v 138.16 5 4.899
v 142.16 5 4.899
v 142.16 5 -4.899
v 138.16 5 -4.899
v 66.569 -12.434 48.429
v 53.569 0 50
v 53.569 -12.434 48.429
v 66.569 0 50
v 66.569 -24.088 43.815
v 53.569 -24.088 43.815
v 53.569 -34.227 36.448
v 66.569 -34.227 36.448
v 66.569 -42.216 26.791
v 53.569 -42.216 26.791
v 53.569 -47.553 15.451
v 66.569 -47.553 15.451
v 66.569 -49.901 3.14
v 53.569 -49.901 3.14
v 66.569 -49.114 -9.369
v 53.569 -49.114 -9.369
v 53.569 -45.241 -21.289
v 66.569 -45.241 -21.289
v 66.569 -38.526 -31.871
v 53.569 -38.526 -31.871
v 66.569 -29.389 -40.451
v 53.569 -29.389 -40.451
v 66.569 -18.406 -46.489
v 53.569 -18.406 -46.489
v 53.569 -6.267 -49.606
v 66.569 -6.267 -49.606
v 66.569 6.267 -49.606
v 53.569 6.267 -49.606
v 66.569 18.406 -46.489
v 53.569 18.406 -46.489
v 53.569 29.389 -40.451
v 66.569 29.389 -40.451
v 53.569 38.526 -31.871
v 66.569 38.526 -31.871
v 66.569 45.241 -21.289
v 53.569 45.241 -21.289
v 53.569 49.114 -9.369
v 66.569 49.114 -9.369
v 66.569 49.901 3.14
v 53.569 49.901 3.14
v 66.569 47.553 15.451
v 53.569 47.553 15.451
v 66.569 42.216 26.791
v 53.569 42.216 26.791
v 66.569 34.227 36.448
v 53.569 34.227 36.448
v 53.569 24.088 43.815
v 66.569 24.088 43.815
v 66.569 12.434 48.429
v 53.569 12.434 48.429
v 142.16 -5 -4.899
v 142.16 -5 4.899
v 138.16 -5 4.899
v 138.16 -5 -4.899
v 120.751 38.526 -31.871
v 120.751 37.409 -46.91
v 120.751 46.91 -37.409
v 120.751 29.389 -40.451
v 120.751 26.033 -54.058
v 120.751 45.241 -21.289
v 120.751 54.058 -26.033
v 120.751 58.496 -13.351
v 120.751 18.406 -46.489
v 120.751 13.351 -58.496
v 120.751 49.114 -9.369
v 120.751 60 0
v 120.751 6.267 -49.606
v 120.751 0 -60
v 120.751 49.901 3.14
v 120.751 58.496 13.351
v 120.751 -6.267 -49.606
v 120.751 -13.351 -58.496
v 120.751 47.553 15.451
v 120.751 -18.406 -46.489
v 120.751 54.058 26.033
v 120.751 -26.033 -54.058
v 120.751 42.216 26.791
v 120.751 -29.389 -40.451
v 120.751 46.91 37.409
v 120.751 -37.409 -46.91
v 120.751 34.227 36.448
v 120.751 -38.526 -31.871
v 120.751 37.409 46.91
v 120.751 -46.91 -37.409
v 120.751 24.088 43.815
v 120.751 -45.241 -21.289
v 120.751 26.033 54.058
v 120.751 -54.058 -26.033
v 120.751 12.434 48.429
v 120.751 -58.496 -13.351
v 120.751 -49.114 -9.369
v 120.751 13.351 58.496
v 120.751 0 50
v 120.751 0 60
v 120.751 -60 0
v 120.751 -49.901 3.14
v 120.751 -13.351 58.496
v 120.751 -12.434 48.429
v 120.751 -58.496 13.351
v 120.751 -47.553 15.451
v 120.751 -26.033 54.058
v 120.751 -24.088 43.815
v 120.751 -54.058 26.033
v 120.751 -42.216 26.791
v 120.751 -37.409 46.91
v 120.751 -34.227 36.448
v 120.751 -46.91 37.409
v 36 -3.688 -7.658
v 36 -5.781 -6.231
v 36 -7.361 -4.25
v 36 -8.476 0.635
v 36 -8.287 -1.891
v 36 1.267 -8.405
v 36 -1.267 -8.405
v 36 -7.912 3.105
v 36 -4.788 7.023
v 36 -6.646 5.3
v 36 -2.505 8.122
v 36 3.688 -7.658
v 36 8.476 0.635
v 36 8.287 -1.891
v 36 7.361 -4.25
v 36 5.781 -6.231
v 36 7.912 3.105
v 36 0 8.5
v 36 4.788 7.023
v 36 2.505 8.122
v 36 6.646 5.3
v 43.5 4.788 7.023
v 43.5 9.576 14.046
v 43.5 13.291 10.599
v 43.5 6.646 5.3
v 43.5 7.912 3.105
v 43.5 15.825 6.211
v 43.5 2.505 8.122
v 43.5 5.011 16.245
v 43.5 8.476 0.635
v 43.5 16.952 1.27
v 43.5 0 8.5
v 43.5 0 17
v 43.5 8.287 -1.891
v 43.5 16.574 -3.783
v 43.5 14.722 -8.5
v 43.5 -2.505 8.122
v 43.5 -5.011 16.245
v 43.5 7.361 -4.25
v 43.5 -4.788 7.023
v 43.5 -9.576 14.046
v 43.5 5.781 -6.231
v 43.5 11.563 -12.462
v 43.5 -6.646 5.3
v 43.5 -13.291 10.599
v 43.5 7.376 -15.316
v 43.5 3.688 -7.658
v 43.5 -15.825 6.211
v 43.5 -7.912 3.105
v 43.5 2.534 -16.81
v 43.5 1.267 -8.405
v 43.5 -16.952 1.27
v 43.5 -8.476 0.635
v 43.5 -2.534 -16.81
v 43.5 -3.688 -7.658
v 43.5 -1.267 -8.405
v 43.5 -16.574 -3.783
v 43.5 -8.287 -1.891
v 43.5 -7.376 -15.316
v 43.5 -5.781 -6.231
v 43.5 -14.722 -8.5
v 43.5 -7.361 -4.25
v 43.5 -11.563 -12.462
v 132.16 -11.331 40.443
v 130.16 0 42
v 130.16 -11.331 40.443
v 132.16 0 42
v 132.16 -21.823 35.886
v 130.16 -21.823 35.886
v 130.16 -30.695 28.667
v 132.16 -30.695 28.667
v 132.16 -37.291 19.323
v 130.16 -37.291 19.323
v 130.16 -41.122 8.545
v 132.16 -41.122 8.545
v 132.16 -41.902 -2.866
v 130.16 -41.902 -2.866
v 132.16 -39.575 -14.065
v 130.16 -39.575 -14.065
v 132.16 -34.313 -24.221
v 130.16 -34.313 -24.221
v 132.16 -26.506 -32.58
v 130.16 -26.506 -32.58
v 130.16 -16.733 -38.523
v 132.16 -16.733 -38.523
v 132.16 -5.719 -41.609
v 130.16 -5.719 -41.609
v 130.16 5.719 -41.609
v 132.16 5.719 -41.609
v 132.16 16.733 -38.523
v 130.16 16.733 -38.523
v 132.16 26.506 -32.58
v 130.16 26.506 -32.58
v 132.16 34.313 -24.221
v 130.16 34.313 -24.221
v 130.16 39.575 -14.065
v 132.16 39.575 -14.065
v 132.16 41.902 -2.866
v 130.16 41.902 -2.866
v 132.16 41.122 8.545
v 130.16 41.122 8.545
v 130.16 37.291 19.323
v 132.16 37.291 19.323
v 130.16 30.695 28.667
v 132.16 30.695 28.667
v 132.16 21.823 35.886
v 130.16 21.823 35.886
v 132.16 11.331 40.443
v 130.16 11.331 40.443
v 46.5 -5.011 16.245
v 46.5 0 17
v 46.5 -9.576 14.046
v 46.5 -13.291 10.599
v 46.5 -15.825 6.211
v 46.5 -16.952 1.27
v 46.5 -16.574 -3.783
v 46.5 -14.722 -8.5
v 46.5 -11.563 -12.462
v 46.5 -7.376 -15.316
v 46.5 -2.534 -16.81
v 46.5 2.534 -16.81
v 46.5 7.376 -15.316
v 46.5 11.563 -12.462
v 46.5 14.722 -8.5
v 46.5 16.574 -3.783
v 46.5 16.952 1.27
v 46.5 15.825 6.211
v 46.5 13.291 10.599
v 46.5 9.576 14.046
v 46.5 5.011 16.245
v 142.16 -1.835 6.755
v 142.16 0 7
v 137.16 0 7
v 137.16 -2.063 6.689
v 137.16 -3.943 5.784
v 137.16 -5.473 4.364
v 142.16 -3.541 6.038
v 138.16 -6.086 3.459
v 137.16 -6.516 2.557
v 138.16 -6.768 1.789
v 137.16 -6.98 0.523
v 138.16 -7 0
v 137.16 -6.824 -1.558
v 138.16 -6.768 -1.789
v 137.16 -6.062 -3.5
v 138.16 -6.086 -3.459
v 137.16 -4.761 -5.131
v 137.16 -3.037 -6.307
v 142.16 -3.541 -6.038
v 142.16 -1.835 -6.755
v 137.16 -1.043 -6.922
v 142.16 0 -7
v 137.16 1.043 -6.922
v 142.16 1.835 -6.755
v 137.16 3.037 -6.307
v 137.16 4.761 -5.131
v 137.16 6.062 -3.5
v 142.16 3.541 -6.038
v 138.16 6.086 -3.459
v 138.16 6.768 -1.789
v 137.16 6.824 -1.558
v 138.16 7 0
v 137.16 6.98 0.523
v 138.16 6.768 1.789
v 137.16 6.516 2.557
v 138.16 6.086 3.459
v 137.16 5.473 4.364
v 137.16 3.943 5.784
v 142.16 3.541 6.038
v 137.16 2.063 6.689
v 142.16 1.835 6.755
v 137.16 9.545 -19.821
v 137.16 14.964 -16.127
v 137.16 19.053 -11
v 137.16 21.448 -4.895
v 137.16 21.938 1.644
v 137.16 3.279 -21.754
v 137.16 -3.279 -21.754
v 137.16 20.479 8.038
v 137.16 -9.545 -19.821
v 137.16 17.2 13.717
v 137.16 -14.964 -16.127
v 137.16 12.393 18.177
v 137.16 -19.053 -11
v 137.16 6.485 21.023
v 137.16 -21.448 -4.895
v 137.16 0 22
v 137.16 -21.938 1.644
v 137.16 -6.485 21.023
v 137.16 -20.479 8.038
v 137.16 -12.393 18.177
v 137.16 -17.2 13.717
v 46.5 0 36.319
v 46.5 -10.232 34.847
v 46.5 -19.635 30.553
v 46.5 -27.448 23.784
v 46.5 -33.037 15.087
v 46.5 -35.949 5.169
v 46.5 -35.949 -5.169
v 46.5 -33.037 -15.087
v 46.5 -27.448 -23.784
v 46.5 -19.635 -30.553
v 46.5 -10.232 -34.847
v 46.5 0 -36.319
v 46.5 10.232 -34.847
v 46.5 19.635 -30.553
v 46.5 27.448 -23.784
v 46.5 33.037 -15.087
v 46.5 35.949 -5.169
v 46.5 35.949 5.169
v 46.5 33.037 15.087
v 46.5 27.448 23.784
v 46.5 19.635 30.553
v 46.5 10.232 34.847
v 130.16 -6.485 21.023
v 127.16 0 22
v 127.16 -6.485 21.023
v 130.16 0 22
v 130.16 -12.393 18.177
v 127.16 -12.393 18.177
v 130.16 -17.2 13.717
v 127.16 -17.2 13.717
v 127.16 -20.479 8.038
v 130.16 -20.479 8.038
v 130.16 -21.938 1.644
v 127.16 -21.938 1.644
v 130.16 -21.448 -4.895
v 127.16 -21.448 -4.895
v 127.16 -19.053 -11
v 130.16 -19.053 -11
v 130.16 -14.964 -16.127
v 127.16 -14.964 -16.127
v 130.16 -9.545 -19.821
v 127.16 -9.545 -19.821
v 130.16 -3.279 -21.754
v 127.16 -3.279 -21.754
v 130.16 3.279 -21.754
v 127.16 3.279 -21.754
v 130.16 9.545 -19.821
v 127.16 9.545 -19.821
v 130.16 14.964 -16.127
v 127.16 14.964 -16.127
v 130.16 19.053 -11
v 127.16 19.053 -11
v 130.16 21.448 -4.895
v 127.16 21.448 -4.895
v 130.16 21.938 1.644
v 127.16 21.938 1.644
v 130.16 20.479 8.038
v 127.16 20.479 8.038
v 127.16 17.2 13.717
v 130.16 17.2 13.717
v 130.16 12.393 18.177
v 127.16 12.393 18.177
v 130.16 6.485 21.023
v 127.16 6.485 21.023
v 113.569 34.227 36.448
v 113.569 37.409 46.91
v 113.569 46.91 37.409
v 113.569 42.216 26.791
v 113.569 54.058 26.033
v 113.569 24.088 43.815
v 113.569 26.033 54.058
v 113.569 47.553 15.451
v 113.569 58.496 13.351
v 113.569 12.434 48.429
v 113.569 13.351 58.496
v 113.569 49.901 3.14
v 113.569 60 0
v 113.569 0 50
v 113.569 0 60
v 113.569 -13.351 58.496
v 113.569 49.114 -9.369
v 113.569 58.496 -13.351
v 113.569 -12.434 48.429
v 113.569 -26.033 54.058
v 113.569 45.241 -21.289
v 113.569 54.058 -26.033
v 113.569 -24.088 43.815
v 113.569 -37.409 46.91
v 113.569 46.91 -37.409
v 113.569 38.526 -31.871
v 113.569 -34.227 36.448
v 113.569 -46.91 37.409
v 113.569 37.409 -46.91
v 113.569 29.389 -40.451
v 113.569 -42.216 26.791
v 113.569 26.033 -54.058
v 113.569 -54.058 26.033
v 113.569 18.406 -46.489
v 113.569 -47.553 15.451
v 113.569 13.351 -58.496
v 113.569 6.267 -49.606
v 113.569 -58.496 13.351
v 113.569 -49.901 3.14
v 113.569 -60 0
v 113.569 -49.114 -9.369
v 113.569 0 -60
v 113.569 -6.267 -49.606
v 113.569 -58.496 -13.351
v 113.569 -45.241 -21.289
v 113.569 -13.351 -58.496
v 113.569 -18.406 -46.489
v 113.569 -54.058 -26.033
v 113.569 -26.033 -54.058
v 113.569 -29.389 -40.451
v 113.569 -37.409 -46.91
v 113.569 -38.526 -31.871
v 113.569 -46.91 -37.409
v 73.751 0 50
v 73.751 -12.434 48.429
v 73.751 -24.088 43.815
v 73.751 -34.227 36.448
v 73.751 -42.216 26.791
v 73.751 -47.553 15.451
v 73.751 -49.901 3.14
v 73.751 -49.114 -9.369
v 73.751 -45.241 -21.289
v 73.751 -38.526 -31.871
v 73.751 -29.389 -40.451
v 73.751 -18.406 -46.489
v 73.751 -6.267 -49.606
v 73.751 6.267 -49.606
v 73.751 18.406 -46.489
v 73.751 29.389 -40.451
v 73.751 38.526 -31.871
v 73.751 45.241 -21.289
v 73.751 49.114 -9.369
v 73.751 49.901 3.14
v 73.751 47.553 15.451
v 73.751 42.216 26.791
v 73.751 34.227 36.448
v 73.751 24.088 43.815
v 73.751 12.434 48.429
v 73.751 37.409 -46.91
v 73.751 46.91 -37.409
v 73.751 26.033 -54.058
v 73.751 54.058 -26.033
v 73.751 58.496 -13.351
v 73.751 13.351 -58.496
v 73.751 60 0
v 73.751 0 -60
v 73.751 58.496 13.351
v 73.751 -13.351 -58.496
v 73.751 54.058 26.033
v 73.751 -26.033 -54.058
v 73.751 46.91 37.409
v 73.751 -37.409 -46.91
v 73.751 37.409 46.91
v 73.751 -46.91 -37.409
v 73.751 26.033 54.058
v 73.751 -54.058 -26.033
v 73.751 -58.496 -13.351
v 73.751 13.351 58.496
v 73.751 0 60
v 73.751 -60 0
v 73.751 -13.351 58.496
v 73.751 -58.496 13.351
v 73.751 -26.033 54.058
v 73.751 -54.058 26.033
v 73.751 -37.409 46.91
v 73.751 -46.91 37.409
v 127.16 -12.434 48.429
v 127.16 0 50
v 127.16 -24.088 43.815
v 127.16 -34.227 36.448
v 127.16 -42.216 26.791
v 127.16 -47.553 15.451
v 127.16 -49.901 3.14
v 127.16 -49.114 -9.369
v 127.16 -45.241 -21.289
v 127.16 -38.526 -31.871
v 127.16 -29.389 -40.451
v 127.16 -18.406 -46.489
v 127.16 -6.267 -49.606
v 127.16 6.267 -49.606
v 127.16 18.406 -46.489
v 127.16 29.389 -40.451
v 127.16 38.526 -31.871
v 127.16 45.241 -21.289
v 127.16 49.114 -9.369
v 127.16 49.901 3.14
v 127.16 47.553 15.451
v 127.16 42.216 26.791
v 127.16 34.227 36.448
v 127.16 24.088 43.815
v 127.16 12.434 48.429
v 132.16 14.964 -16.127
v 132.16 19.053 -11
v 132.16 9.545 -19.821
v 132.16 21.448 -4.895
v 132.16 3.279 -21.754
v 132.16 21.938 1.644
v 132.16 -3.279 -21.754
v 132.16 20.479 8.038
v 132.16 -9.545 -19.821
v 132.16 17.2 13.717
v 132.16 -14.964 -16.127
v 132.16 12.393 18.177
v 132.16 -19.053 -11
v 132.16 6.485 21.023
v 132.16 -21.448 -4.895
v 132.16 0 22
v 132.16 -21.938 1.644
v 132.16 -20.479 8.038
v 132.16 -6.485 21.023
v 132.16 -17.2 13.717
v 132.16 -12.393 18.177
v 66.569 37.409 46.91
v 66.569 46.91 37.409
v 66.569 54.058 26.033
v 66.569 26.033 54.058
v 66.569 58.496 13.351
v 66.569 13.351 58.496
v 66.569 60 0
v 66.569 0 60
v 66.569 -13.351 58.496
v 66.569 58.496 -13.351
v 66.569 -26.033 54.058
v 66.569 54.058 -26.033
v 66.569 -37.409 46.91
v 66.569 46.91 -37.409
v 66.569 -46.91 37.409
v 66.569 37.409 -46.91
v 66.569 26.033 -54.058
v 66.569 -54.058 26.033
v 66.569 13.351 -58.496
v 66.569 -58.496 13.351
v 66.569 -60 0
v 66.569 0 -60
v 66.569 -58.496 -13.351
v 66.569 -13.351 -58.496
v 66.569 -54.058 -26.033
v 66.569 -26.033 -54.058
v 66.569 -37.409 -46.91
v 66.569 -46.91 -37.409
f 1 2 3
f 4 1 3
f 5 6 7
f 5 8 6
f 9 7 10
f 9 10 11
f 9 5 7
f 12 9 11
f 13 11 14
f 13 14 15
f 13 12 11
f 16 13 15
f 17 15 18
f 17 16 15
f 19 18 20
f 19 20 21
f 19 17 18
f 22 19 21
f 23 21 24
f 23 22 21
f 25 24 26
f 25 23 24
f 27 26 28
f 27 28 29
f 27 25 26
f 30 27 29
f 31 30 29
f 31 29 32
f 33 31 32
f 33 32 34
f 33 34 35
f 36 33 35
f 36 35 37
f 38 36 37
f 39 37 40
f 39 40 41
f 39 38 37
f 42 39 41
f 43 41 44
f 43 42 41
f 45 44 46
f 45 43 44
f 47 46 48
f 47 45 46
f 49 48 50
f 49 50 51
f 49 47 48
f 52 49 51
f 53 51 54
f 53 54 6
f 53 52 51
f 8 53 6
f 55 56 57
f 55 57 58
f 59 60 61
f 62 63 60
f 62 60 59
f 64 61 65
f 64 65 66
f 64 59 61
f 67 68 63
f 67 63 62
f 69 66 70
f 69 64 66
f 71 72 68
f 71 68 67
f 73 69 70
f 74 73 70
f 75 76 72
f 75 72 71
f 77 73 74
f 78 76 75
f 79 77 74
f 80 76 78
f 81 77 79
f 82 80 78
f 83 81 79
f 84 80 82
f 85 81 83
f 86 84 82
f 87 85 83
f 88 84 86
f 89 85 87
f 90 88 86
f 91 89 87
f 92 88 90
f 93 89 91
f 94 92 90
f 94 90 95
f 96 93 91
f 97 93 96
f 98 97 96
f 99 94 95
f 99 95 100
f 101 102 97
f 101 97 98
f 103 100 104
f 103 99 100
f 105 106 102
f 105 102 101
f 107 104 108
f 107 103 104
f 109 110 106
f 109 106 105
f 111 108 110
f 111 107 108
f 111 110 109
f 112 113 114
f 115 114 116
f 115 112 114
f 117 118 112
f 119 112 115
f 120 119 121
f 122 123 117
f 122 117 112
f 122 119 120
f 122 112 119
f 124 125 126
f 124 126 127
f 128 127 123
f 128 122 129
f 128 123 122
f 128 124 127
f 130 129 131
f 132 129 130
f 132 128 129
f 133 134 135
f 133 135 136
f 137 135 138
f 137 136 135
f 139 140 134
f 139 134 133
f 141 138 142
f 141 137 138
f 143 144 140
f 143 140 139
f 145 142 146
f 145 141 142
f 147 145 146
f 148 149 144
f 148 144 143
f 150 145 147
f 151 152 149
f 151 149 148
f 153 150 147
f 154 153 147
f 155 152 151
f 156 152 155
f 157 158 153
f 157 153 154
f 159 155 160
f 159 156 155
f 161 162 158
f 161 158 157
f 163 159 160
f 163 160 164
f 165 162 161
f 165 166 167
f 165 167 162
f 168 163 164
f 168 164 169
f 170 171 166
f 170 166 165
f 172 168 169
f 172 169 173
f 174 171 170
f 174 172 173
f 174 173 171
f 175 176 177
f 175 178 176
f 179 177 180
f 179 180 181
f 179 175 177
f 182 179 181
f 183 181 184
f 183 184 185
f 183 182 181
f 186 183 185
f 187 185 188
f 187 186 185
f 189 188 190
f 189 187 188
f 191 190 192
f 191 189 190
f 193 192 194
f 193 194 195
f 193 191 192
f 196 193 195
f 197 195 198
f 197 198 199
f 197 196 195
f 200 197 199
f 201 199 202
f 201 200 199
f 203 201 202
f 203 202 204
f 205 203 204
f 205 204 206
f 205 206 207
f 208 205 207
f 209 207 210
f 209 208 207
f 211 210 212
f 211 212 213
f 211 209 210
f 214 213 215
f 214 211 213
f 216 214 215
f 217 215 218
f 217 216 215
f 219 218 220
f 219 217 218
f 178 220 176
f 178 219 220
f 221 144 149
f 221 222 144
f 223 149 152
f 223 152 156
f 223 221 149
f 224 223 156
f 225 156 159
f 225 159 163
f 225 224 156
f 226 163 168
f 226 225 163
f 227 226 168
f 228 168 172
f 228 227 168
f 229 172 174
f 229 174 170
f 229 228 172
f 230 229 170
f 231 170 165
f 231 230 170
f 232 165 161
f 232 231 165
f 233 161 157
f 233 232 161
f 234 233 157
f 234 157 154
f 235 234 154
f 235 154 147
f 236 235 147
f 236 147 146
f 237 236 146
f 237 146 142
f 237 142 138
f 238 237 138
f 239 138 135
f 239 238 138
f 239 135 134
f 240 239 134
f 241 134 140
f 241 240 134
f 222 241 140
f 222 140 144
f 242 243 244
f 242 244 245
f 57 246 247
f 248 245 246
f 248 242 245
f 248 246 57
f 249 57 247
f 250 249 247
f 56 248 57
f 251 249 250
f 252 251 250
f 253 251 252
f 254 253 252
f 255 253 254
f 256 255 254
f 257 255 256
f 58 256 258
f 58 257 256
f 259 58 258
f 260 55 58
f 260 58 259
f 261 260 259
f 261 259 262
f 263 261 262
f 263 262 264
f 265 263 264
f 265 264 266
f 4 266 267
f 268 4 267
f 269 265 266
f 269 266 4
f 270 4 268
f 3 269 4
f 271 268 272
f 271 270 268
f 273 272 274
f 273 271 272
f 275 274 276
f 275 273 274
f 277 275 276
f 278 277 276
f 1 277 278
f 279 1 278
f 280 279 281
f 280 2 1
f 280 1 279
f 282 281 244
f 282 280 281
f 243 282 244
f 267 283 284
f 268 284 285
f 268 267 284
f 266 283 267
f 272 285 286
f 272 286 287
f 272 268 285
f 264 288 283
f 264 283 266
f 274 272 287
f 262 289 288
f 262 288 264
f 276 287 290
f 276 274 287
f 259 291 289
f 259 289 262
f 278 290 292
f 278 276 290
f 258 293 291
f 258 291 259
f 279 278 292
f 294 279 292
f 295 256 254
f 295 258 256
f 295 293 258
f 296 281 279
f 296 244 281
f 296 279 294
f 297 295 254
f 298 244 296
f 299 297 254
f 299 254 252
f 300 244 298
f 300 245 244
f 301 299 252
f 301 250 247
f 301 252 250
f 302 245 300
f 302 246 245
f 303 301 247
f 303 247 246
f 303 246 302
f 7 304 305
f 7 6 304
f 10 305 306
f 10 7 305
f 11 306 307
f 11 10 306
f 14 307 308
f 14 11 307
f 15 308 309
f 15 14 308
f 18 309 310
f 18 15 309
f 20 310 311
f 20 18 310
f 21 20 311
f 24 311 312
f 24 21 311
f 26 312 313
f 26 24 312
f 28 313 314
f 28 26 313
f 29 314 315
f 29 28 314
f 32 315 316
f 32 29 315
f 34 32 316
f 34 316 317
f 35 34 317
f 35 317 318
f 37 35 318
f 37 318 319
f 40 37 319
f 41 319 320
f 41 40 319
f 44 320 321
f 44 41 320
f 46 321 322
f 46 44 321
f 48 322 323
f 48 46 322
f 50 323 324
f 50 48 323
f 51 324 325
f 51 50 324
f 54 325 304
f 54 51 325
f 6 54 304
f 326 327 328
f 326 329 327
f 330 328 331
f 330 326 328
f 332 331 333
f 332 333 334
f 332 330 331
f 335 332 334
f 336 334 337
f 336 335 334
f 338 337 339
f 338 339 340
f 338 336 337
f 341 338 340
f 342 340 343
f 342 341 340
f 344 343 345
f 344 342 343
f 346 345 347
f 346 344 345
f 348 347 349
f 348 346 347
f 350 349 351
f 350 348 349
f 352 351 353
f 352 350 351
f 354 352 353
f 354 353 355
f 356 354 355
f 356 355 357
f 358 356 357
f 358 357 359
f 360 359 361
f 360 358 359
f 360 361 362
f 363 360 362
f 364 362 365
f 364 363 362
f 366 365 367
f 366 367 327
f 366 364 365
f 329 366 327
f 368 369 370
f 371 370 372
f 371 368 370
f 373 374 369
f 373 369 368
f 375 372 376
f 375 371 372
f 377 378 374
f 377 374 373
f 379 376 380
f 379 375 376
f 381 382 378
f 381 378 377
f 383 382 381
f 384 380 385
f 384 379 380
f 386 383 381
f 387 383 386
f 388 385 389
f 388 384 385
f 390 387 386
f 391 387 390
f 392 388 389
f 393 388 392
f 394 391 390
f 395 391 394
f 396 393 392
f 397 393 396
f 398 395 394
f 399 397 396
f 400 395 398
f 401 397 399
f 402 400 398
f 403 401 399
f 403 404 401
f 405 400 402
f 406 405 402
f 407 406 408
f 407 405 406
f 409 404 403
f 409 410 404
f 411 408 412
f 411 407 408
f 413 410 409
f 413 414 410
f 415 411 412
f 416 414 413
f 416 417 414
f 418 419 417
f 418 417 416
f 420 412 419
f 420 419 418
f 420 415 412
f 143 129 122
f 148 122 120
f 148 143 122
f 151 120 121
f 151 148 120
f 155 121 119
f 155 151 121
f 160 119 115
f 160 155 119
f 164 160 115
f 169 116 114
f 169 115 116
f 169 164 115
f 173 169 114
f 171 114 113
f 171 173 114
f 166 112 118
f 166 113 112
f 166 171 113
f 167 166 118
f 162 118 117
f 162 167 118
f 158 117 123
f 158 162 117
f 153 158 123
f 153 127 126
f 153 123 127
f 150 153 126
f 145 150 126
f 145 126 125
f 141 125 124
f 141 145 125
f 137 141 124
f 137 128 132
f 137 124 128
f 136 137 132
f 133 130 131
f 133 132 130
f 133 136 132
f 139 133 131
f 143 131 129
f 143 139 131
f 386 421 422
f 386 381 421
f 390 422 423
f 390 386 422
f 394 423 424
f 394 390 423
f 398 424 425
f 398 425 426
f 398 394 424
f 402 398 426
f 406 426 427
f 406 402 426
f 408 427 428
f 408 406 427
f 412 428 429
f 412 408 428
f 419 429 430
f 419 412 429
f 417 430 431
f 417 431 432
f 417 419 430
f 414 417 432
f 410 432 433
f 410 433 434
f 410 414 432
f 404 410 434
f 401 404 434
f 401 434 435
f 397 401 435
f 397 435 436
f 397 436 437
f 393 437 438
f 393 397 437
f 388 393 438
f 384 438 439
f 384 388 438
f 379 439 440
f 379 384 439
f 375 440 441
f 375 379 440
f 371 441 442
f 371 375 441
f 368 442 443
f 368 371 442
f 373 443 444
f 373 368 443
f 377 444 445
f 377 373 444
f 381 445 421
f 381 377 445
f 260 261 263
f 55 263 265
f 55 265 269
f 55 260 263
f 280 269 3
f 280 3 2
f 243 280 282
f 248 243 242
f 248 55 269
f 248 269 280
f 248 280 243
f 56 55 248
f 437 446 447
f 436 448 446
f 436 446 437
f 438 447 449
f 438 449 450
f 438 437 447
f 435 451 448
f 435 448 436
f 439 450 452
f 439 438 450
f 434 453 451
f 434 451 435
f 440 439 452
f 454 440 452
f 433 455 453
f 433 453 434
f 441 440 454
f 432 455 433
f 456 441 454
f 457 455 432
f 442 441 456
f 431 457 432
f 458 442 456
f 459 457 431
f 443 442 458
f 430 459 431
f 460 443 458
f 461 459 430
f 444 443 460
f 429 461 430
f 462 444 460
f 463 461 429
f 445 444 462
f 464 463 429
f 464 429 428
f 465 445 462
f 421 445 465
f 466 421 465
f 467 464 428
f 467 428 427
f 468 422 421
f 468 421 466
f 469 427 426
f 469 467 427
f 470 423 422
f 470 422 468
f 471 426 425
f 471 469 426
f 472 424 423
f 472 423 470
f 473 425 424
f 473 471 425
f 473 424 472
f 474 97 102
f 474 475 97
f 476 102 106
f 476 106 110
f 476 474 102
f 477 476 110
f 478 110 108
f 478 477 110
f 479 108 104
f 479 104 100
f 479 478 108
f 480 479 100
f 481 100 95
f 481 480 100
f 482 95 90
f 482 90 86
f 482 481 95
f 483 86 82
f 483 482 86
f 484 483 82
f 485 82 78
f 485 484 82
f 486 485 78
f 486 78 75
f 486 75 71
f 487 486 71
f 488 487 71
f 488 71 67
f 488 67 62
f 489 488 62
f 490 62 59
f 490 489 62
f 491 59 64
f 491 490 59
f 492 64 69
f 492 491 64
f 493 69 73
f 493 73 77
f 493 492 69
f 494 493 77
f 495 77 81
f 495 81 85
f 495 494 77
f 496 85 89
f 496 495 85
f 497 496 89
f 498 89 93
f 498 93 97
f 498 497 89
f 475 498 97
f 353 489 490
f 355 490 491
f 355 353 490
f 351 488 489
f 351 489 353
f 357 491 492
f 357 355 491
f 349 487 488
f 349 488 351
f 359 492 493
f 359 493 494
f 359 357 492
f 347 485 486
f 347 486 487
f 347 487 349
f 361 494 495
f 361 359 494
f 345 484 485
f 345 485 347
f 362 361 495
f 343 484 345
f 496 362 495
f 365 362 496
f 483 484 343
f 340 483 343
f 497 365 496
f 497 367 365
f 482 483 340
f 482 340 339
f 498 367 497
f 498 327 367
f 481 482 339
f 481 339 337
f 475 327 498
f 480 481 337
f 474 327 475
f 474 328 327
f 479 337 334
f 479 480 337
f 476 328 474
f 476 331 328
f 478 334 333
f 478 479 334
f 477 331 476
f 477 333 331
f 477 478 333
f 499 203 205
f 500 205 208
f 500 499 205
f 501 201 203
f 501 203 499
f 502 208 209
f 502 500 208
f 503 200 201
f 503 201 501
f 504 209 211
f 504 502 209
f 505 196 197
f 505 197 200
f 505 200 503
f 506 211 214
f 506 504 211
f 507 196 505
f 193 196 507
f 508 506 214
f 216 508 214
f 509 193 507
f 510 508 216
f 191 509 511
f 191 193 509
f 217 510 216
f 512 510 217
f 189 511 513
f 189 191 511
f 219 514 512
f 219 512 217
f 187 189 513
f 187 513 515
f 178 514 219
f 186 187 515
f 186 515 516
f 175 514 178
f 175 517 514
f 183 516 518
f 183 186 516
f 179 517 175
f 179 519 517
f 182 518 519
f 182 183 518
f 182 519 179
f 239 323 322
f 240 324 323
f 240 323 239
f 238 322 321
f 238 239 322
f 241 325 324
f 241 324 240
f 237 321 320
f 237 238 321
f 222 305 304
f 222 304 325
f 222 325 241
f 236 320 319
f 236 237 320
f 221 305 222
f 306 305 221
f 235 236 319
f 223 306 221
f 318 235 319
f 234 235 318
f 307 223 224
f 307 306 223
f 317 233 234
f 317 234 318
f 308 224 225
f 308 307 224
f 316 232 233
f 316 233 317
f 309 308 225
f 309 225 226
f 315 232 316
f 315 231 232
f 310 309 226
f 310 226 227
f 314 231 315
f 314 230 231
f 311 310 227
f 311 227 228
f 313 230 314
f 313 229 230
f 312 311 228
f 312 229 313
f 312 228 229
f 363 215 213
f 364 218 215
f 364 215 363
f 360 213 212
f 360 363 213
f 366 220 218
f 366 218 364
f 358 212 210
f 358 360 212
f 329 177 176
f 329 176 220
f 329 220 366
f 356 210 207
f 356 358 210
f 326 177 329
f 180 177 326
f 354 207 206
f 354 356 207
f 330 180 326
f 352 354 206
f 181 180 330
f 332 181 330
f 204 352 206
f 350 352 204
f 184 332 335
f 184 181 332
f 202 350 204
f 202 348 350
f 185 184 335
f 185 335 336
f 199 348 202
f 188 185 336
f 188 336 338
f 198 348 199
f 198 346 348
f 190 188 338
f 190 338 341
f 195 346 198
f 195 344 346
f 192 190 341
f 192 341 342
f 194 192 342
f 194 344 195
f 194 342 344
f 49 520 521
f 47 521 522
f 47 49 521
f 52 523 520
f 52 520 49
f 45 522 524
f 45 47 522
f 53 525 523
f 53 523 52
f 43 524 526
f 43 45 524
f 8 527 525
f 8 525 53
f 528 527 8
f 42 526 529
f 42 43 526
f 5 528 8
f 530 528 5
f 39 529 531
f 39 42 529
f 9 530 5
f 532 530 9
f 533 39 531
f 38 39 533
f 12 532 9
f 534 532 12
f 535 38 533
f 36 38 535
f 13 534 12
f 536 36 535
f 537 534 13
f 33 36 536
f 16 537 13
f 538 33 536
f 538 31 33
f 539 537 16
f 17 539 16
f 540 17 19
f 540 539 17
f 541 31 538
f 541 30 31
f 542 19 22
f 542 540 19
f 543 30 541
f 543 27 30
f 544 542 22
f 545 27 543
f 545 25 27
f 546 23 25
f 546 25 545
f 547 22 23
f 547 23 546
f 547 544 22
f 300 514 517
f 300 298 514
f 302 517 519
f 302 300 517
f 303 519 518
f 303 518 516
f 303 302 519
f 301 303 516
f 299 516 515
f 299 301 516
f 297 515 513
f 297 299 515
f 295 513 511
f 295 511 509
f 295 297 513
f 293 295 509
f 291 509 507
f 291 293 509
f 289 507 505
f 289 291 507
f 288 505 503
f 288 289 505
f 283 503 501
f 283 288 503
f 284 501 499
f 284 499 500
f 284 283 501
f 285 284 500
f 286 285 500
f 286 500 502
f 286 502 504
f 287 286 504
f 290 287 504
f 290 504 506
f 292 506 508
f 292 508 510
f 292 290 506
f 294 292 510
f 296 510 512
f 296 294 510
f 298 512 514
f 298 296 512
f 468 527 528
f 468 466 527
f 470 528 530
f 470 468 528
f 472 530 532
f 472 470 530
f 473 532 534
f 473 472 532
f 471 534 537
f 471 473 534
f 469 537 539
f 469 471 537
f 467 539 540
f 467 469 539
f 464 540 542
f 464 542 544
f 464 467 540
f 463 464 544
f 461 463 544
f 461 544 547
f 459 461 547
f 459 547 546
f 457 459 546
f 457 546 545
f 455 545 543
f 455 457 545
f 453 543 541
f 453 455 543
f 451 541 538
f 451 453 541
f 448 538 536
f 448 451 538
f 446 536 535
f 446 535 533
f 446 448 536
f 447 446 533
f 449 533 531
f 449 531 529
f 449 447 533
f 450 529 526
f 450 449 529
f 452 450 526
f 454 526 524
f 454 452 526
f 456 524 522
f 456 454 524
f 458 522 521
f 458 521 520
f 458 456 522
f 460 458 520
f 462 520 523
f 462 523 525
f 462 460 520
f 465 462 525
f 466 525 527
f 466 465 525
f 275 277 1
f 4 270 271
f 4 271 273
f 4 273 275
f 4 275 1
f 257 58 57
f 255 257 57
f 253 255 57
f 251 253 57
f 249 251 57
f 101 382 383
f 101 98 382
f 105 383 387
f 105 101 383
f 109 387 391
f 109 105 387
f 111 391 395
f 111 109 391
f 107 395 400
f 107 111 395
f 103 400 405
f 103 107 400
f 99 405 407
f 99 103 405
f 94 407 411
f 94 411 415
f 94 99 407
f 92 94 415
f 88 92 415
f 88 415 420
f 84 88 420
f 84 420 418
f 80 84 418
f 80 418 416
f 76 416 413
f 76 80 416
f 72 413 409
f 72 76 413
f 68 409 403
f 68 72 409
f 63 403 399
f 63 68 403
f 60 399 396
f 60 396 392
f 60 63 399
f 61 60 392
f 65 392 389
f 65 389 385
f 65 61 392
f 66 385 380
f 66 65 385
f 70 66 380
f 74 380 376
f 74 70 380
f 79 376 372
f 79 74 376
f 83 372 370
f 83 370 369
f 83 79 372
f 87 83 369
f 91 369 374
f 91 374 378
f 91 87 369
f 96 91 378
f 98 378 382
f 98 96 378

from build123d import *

# Parameters (mm, degrees)
CUT_EXTRUDE1_DEPTH      = 4
CUT_EXTRUDE2_DEPTH      = 139.260282077
CUT_EXTRUDE2_DEPTH_BACK = 3
SKETCH3_R               = 8.5


with BuildPart() as part:
    # Sketch1 → Revolve1 (revolve)
    with BuildSketch(Plane.XY, mode=Mode.PRIVATE) as revolve1_sk:
        Polygon((0, 0), (0, 6), (33, 6), (33, 8.5), (43.5, 8.5), (43.5, 17), (46.5, 17), (46.5, 36.31855833), (53.568965517, 50), (66.568965517, 50), (66.568965517, 60), (73.751034483, 60), (73.751034483, 50), (113.568965517, 50), (113.568965517, 60), (120.751034483, 60), (120.751034483, 50), (127.16, 50), (127.16, 22), (130.16, 22), (130.16, 42), (132.16, 42), (132.16, 22), (137.16, 22), (137.16, 7), (142.16, 7), (142.16, 0), align=None)
    revolve(revolve1_sk.sketch.rotate(Axis((0, 0, 0), (1, 0, 0)), 90), axis=Axis((0, 0, 0), (1, 0, 0)))

    # Sketch2 → Cut-Extrude1 (cut)
    with BuildSketch(Plane(origin=(142.16, 0, 0), x_dir=(0, 0, -1), z_dir=(1, 0, 0))):
        with BuildLine():
            Line((-4.898979486, 5), (4.898979486, 5))
            ThreePointArc((4.898979486, 5), (0, 7), (-4.898979486, 5))
        make_face()
        with BuildLine():
            Line((-4.898979486, -5), (4.898979486, -5))
            ThreePointArc((4.898979486, -5), (0, -7), (-4.898979486, -5))
        make_face()
    extrude(amount=-CUT_EXTRUDE1_DEPTH, mode=Mode.SUBTRACT)

    # Sketch3 → Cut-Extrude2 (cut, two sides: drawn at the far end of the back side and taken through both)
    with BuildSketch(Plane.ZY.offset(-33).offset(-CUT_EXTRUDE2_DEPTH_BACK)):
        Circle(SKETCH3_R)
    extrude(amount=CUT_EXTRUDE2_DEPTH + CUT_EXTRUDE2_DEPTH_BACK, mode=Mode.SUBTRACT)


solid = part.part
